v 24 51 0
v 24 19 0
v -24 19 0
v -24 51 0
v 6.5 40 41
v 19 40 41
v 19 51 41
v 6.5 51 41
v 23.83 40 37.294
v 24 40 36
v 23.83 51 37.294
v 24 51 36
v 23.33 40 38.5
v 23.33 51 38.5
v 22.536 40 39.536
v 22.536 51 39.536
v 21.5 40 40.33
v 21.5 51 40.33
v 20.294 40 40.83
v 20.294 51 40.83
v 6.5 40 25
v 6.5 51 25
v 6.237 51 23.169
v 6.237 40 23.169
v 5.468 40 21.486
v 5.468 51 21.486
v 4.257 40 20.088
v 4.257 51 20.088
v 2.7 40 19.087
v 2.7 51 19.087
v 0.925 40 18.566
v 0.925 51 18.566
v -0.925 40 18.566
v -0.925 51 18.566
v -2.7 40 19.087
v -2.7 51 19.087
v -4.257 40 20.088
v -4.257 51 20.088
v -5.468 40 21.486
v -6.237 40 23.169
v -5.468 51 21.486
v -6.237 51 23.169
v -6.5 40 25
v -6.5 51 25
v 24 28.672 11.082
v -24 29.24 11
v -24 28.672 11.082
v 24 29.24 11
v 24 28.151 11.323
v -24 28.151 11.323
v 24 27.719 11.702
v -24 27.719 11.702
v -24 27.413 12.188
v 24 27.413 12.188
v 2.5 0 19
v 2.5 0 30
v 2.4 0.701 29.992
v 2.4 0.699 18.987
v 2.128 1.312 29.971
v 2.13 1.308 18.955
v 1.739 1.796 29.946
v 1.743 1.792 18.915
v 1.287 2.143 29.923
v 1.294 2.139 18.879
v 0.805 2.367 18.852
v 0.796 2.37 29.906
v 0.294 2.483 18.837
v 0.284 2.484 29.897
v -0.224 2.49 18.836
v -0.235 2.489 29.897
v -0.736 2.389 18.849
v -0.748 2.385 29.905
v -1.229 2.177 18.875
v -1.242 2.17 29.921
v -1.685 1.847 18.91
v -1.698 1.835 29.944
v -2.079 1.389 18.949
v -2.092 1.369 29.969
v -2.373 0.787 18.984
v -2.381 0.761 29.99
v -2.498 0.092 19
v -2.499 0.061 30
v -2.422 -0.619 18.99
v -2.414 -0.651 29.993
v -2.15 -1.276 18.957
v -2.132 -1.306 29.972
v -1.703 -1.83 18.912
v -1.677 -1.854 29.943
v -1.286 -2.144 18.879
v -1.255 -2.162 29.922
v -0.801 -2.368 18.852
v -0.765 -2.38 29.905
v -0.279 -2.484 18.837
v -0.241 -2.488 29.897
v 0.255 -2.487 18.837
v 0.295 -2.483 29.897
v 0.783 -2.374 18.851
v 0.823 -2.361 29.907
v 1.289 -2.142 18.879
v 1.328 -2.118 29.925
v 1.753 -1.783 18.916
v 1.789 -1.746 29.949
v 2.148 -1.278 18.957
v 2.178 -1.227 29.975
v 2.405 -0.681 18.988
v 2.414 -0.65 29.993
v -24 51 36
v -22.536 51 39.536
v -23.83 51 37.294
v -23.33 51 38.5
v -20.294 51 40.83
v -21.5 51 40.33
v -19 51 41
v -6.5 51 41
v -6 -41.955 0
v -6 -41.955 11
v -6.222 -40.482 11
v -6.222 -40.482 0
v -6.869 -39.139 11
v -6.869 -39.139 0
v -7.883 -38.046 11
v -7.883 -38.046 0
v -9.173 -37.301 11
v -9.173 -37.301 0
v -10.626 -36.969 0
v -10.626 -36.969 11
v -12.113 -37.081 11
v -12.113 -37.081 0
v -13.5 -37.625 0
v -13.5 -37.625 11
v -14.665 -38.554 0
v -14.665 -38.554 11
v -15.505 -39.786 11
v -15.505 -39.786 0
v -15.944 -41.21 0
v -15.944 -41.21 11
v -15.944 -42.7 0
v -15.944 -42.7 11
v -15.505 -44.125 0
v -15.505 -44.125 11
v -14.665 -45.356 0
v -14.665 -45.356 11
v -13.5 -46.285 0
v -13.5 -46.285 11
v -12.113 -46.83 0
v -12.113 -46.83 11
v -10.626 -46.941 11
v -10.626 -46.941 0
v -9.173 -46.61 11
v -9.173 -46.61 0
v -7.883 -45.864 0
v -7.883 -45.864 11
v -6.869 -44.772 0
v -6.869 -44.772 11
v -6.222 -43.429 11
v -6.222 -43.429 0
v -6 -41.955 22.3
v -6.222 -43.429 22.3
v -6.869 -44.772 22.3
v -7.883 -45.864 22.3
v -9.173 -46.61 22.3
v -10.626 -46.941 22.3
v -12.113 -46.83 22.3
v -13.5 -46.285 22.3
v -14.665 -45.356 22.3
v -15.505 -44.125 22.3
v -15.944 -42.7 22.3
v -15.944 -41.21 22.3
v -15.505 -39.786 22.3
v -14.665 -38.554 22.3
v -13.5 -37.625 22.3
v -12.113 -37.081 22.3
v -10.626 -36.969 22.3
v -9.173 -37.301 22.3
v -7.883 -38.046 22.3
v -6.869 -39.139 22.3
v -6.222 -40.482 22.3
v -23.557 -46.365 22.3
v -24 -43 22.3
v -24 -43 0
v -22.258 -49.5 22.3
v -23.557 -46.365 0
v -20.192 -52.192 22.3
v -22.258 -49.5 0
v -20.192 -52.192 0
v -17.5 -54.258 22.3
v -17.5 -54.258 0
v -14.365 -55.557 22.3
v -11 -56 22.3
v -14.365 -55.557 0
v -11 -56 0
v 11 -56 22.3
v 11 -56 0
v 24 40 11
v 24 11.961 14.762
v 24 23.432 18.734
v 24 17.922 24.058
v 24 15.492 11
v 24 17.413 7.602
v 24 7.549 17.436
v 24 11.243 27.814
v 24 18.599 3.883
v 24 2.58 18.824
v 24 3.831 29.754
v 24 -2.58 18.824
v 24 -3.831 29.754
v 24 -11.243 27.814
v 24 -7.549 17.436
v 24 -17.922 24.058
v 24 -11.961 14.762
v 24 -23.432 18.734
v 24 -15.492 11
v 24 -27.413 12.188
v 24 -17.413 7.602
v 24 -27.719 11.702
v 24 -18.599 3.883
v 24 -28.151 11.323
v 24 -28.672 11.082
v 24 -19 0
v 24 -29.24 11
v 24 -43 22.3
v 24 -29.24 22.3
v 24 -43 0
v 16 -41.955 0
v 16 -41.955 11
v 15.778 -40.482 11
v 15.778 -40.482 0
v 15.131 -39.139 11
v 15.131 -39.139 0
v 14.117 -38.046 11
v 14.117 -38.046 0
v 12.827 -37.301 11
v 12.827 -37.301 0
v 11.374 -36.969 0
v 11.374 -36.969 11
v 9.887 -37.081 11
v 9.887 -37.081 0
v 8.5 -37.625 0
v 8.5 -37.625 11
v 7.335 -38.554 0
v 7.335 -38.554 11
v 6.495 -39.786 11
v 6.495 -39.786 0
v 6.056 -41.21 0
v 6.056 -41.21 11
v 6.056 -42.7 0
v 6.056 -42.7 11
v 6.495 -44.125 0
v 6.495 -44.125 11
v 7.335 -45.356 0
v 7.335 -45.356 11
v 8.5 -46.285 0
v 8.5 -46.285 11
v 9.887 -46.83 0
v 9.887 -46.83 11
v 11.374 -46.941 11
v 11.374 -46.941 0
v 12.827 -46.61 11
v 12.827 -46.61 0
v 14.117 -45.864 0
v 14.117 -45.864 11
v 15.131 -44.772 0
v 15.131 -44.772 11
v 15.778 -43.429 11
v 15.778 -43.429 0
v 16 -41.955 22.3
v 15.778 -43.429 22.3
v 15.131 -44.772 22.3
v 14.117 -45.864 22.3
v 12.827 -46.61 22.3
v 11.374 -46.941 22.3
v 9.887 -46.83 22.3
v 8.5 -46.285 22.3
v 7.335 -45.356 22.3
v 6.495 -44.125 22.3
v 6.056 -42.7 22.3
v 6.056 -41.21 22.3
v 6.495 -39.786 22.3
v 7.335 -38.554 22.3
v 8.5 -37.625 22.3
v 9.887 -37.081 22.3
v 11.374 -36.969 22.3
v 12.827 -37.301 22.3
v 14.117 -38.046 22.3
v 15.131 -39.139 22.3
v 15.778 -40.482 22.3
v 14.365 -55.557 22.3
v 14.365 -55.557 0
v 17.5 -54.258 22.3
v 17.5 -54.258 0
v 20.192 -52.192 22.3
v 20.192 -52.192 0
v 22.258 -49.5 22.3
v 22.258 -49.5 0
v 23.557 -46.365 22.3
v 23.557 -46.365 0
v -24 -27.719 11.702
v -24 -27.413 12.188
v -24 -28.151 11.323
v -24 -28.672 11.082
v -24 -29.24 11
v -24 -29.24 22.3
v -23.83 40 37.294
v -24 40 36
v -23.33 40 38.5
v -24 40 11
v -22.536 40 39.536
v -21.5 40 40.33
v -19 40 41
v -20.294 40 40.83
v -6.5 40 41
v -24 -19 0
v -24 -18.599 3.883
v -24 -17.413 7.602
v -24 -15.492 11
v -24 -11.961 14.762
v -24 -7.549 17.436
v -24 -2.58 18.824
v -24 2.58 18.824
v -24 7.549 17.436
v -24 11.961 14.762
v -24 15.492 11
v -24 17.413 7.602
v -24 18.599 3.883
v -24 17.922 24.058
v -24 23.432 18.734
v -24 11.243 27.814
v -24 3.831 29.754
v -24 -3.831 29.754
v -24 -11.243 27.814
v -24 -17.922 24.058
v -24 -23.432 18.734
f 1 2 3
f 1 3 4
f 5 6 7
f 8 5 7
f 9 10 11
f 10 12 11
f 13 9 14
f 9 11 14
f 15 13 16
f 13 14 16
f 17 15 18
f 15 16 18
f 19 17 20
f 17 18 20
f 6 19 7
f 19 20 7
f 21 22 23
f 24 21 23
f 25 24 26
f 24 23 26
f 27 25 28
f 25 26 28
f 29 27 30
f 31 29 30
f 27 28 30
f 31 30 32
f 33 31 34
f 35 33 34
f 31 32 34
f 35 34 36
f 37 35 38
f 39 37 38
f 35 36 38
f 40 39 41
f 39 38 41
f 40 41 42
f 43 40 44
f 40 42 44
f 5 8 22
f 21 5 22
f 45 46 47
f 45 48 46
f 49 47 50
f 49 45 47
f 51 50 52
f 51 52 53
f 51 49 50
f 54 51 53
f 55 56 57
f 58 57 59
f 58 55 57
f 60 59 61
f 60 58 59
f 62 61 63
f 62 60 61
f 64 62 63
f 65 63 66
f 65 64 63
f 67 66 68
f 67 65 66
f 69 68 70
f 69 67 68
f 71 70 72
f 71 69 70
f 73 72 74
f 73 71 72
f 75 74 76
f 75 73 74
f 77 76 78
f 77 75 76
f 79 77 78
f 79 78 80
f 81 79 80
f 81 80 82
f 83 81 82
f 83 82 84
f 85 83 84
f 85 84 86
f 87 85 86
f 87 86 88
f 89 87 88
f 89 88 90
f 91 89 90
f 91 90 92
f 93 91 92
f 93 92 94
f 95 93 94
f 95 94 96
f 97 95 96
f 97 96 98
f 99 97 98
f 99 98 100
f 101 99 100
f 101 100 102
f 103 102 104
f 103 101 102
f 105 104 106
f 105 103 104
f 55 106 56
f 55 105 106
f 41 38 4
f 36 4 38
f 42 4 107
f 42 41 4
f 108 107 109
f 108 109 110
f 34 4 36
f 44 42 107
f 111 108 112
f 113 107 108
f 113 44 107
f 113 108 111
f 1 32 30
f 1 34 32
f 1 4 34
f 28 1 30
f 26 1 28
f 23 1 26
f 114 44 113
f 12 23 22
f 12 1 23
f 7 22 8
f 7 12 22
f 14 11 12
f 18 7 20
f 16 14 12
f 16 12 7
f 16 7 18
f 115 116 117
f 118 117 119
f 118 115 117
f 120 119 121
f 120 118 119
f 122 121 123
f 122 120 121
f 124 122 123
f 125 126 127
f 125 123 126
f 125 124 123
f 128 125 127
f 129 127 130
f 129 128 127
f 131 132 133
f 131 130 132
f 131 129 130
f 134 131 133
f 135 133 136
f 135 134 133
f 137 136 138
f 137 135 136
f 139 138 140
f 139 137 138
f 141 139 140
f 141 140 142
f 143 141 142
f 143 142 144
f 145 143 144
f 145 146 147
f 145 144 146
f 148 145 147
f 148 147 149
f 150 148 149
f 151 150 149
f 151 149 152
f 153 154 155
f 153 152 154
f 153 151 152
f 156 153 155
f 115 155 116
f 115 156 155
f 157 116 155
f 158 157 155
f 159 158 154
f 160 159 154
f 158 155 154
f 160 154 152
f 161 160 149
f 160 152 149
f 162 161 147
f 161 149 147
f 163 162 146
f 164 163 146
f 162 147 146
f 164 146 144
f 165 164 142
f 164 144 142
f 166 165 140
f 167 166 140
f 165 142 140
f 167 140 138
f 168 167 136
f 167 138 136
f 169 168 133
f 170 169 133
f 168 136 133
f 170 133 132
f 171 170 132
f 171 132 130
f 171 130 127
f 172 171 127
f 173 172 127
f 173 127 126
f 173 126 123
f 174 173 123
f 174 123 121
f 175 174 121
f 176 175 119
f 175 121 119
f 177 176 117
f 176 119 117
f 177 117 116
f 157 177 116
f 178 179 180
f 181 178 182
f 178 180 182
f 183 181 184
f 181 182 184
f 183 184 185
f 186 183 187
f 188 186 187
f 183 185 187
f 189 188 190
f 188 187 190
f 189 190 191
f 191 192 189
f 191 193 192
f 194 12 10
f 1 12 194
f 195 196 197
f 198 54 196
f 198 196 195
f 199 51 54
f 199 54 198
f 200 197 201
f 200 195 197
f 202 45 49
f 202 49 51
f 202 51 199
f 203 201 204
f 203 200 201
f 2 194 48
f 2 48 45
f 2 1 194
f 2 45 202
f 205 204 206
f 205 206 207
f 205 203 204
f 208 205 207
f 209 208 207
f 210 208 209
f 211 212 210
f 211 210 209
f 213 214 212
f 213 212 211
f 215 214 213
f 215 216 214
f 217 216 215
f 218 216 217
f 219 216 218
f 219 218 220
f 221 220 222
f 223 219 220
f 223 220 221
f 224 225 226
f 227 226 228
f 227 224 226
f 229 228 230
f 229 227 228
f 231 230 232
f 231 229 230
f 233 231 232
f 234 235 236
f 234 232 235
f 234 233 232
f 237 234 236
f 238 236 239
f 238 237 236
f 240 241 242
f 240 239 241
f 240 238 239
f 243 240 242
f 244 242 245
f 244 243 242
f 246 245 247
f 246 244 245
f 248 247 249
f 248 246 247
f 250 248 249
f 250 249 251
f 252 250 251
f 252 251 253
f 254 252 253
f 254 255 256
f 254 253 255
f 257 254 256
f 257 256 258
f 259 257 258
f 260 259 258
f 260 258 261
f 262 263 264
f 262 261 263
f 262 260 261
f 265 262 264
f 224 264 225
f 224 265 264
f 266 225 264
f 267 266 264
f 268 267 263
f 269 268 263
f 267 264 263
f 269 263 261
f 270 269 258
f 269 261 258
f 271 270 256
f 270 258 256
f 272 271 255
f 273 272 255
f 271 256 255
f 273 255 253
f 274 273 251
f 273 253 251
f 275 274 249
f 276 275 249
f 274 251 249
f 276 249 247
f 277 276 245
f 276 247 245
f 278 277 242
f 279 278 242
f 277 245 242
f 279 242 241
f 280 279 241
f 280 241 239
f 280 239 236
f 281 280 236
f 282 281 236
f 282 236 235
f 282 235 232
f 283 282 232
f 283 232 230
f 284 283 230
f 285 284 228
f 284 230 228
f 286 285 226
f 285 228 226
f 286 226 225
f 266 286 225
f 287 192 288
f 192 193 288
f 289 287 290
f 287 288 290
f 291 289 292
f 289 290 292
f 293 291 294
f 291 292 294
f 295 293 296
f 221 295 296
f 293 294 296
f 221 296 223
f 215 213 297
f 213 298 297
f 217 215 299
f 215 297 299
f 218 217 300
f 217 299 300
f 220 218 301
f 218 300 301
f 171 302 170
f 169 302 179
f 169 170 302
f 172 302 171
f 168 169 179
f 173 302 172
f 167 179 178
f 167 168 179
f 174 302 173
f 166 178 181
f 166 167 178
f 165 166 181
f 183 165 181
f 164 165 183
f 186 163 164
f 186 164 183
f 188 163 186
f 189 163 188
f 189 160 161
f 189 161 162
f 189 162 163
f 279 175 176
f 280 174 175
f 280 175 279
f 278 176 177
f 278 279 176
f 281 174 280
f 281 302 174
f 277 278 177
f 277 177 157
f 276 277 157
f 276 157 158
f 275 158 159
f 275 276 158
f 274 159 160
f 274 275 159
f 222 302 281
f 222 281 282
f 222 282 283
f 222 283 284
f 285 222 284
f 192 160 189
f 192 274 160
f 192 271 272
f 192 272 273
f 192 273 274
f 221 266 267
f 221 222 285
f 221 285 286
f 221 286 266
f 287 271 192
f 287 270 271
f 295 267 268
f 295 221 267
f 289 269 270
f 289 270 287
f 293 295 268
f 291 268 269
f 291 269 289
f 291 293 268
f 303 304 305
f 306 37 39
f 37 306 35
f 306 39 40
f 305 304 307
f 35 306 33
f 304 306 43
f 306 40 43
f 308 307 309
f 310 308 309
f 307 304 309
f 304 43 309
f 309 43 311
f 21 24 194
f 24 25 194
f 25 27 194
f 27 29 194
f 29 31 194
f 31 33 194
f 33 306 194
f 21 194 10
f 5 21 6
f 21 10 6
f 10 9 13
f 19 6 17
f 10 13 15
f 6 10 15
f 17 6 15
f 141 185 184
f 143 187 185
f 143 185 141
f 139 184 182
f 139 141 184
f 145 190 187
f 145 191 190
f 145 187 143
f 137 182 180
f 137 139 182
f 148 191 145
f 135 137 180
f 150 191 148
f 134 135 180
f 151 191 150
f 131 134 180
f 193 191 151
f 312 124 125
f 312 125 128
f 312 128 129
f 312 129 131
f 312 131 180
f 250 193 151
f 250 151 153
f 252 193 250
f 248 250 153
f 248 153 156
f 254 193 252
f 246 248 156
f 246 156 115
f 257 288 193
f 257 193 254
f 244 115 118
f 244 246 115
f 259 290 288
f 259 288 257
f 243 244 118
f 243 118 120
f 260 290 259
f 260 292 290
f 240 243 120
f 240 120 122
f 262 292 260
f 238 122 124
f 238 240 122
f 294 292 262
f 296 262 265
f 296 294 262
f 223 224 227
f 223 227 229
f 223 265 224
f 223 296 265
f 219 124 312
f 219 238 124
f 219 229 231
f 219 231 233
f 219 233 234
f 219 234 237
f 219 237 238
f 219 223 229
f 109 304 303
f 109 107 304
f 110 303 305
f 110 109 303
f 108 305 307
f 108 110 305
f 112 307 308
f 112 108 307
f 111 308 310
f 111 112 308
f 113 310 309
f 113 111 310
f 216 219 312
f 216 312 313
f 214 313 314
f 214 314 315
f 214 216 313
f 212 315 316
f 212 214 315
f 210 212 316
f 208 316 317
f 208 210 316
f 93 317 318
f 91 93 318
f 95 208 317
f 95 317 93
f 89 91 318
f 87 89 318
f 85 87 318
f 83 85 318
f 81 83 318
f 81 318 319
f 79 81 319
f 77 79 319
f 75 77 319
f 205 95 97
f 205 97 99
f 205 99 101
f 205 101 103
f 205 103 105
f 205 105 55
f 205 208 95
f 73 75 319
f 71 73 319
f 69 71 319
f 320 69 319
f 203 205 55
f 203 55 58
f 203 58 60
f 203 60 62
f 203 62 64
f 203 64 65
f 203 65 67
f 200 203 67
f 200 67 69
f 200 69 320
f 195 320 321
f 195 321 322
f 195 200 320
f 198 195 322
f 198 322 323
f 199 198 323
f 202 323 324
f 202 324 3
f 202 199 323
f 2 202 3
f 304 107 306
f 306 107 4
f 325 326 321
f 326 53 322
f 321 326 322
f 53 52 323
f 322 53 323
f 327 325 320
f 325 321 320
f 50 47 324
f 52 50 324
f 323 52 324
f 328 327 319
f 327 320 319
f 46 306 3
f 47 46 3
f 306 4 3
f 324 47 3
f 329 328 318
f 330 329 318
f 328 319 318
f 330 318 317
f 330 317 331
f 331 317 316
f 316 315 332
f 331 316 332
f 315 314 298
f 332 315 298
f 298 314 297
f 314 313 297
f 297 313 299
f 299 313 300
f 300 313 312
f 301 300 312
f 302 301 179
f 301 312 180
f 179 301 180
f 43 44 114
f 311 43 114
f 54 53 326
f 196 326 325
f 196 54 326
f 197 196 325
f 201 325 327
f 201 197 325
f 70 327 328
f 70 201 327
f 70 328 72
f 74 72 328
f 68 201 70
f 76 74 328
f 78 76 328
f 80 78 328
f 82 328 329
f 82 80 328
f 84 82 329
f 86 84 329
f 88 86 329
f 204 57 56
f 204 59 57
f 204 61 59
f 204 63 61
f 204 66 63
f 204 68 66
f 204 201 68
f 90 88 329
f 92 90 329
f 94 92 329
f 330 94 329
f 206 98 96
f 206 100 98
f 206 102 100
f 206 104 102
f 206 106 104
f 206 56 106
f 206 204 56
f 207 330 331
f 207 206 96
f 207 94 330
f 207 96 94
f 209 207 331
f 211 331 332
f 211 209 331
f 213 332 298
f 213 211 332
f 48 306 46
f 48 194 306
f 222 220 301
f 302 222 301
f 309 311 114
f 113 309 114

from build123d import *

# Parameters (mm, degrees)
F0_W     = 11
F0_H     = 30
F1_DEPTH = 24
F3_DEPTH = 11
F4_R     = 2.5
F4_R_2   = 5
F5_DEPTH = 41.001
F6_R     = 13
F7_R     = 5
F8_R     = 2
F9_DEPTH = 11.3


with BuildPart() as f1:
    # F0 (on Right) → F1 (new body, symmetric)
    with BuildSketch(Plane.YZ):
        with BuildLine():
            Line((-56, 0), (-30, 0))
            ThreePointArc((-30, 0), (-29.4730143031, 5.5983415304), (-27.9105714739, 11))
            Line((-27.9105714739, 11), (-56, 11))
            Line((-56, 11), (-56, 0))
        make_face()
        with BuildLine():
            Line((-30, 0), (-19, 0))
            ThreePointArc((-19, 0), (-18.1017503893, 5.7729223833), (-15.4919333848, 11))
            Line((-15.4919333848, 11), (-27.9105714739, 11))
            ThreePointArc((-27.9105714739, 11), (-29.4730143031, 5.5983415304), (-30, 0))
        make_face()
        with BuildLine():
            ThreePointArc((15.4919333848, 11), (18.1017503893, 5.7729223833), (19, 0))
            Line((19, 0), (30, 0))
            ThreePointArc((30, 0), (29.4730143031, 5.5983415304), (27.9105714739, 11))
            Line((27.9105714739, 11), (15.4919333848, 11))
        make_face()
        with BuildLine():
            ThreePointArc((-15.4919333848, 11), (0, 19), (15.4919333848, 11))
            Line((15.4919333848, 11), (27.9105714739, 11))
            ThreePointArc((27.9105714739, 11), (0, 30), (-27.9105714739, 11))
            Line((-27.9105714739, 11), (-15.4919333848, 11))
        make_face()
        with BuildLine():
            ThreePointArc((27.9105714739, 11), (29.4730143031, 5.5983415304), (30, 0))
            Line((30, 0), (51, 0))
            Line((51, 0), (51, 11))
            Line((51, 11), (40, 11))
            Line((40, 11), (27.9105714739, 11))
        make_face()
        with Locations((45.5, 26)):
            Rectangle(F0_W, F0_H)
    extrude(amount=F1_DEPTH, both=True)

    # F2 (on face) → F3 (cut, through all)
    with BuildSketch(Plane(origin=(0, 51, 0), x_dir=(-1, 0, 0), z_dir=(0, 1, 0))):
        with BuildLine():
            ThreePointArc((-6.5, 25), (0, 18.5), (6.5, 25))
            ThreePointArc((6.5, 25), (0, 31.5), (-6.5, 25))
        make_face()
        with BuildLine():
            ThreePointArc((-6.5, 25), (0, 31.5), (6.5, 25))
            Line((6.5, 25), (6.5, 41))
            Line((6.5, 41), (-6.5, 41))
            Line((-6.5, 41), (-6.5, 25))
        make_face()
    extrude(amount=-F3_DEPTH, mode=Mode.SUBTRACT)

    # F4 (on Top) → F5 (cut, through all)
    with BuildSketch(Plane.XY):
        Circle(F4_R)
        with Locations((-11, -41.955285737)):
            Circle(F4_R_2)
        with Locations((11, -41.955285737)):
            Circle(F4_R_2)
    extrude(amount=F5_DEPTH, mode=Mode.SUBTRACT)

    # F6
    f6_edges = [f1.edges().sort_by_distance(p)[0] for p in [
        (24, -56, 5.5),
        (-24, -56, 5.5),
    ]]
    fillet(f6_edges, radius=F6_R)

    # F7
    f7_edges = [f1.edges().sort_by_distance(p)[0] for p in [
        (24, 45.5, 41),
        (-24, 45.5, 41),
    ]]
    fillet(f7_edges, radius=F7_R)

    # F8
    f8_edges = [f1.edges().sort_by_distance(p)[0] for p in [
        (0, -27.910571, 11),
        (0, 27.910571, 11),
    ]]
    fillet(f8_edges, radius=F8_R)

    # F9 (add): a face of the model
    f9_faces = [f1.faces().sort_by_distance(p)[0] for p in [
        (0, -41.9988312455, 11),
    ]]
    extrude(f9_faces, amount=F9_DEPTH)


solid = f1.part
